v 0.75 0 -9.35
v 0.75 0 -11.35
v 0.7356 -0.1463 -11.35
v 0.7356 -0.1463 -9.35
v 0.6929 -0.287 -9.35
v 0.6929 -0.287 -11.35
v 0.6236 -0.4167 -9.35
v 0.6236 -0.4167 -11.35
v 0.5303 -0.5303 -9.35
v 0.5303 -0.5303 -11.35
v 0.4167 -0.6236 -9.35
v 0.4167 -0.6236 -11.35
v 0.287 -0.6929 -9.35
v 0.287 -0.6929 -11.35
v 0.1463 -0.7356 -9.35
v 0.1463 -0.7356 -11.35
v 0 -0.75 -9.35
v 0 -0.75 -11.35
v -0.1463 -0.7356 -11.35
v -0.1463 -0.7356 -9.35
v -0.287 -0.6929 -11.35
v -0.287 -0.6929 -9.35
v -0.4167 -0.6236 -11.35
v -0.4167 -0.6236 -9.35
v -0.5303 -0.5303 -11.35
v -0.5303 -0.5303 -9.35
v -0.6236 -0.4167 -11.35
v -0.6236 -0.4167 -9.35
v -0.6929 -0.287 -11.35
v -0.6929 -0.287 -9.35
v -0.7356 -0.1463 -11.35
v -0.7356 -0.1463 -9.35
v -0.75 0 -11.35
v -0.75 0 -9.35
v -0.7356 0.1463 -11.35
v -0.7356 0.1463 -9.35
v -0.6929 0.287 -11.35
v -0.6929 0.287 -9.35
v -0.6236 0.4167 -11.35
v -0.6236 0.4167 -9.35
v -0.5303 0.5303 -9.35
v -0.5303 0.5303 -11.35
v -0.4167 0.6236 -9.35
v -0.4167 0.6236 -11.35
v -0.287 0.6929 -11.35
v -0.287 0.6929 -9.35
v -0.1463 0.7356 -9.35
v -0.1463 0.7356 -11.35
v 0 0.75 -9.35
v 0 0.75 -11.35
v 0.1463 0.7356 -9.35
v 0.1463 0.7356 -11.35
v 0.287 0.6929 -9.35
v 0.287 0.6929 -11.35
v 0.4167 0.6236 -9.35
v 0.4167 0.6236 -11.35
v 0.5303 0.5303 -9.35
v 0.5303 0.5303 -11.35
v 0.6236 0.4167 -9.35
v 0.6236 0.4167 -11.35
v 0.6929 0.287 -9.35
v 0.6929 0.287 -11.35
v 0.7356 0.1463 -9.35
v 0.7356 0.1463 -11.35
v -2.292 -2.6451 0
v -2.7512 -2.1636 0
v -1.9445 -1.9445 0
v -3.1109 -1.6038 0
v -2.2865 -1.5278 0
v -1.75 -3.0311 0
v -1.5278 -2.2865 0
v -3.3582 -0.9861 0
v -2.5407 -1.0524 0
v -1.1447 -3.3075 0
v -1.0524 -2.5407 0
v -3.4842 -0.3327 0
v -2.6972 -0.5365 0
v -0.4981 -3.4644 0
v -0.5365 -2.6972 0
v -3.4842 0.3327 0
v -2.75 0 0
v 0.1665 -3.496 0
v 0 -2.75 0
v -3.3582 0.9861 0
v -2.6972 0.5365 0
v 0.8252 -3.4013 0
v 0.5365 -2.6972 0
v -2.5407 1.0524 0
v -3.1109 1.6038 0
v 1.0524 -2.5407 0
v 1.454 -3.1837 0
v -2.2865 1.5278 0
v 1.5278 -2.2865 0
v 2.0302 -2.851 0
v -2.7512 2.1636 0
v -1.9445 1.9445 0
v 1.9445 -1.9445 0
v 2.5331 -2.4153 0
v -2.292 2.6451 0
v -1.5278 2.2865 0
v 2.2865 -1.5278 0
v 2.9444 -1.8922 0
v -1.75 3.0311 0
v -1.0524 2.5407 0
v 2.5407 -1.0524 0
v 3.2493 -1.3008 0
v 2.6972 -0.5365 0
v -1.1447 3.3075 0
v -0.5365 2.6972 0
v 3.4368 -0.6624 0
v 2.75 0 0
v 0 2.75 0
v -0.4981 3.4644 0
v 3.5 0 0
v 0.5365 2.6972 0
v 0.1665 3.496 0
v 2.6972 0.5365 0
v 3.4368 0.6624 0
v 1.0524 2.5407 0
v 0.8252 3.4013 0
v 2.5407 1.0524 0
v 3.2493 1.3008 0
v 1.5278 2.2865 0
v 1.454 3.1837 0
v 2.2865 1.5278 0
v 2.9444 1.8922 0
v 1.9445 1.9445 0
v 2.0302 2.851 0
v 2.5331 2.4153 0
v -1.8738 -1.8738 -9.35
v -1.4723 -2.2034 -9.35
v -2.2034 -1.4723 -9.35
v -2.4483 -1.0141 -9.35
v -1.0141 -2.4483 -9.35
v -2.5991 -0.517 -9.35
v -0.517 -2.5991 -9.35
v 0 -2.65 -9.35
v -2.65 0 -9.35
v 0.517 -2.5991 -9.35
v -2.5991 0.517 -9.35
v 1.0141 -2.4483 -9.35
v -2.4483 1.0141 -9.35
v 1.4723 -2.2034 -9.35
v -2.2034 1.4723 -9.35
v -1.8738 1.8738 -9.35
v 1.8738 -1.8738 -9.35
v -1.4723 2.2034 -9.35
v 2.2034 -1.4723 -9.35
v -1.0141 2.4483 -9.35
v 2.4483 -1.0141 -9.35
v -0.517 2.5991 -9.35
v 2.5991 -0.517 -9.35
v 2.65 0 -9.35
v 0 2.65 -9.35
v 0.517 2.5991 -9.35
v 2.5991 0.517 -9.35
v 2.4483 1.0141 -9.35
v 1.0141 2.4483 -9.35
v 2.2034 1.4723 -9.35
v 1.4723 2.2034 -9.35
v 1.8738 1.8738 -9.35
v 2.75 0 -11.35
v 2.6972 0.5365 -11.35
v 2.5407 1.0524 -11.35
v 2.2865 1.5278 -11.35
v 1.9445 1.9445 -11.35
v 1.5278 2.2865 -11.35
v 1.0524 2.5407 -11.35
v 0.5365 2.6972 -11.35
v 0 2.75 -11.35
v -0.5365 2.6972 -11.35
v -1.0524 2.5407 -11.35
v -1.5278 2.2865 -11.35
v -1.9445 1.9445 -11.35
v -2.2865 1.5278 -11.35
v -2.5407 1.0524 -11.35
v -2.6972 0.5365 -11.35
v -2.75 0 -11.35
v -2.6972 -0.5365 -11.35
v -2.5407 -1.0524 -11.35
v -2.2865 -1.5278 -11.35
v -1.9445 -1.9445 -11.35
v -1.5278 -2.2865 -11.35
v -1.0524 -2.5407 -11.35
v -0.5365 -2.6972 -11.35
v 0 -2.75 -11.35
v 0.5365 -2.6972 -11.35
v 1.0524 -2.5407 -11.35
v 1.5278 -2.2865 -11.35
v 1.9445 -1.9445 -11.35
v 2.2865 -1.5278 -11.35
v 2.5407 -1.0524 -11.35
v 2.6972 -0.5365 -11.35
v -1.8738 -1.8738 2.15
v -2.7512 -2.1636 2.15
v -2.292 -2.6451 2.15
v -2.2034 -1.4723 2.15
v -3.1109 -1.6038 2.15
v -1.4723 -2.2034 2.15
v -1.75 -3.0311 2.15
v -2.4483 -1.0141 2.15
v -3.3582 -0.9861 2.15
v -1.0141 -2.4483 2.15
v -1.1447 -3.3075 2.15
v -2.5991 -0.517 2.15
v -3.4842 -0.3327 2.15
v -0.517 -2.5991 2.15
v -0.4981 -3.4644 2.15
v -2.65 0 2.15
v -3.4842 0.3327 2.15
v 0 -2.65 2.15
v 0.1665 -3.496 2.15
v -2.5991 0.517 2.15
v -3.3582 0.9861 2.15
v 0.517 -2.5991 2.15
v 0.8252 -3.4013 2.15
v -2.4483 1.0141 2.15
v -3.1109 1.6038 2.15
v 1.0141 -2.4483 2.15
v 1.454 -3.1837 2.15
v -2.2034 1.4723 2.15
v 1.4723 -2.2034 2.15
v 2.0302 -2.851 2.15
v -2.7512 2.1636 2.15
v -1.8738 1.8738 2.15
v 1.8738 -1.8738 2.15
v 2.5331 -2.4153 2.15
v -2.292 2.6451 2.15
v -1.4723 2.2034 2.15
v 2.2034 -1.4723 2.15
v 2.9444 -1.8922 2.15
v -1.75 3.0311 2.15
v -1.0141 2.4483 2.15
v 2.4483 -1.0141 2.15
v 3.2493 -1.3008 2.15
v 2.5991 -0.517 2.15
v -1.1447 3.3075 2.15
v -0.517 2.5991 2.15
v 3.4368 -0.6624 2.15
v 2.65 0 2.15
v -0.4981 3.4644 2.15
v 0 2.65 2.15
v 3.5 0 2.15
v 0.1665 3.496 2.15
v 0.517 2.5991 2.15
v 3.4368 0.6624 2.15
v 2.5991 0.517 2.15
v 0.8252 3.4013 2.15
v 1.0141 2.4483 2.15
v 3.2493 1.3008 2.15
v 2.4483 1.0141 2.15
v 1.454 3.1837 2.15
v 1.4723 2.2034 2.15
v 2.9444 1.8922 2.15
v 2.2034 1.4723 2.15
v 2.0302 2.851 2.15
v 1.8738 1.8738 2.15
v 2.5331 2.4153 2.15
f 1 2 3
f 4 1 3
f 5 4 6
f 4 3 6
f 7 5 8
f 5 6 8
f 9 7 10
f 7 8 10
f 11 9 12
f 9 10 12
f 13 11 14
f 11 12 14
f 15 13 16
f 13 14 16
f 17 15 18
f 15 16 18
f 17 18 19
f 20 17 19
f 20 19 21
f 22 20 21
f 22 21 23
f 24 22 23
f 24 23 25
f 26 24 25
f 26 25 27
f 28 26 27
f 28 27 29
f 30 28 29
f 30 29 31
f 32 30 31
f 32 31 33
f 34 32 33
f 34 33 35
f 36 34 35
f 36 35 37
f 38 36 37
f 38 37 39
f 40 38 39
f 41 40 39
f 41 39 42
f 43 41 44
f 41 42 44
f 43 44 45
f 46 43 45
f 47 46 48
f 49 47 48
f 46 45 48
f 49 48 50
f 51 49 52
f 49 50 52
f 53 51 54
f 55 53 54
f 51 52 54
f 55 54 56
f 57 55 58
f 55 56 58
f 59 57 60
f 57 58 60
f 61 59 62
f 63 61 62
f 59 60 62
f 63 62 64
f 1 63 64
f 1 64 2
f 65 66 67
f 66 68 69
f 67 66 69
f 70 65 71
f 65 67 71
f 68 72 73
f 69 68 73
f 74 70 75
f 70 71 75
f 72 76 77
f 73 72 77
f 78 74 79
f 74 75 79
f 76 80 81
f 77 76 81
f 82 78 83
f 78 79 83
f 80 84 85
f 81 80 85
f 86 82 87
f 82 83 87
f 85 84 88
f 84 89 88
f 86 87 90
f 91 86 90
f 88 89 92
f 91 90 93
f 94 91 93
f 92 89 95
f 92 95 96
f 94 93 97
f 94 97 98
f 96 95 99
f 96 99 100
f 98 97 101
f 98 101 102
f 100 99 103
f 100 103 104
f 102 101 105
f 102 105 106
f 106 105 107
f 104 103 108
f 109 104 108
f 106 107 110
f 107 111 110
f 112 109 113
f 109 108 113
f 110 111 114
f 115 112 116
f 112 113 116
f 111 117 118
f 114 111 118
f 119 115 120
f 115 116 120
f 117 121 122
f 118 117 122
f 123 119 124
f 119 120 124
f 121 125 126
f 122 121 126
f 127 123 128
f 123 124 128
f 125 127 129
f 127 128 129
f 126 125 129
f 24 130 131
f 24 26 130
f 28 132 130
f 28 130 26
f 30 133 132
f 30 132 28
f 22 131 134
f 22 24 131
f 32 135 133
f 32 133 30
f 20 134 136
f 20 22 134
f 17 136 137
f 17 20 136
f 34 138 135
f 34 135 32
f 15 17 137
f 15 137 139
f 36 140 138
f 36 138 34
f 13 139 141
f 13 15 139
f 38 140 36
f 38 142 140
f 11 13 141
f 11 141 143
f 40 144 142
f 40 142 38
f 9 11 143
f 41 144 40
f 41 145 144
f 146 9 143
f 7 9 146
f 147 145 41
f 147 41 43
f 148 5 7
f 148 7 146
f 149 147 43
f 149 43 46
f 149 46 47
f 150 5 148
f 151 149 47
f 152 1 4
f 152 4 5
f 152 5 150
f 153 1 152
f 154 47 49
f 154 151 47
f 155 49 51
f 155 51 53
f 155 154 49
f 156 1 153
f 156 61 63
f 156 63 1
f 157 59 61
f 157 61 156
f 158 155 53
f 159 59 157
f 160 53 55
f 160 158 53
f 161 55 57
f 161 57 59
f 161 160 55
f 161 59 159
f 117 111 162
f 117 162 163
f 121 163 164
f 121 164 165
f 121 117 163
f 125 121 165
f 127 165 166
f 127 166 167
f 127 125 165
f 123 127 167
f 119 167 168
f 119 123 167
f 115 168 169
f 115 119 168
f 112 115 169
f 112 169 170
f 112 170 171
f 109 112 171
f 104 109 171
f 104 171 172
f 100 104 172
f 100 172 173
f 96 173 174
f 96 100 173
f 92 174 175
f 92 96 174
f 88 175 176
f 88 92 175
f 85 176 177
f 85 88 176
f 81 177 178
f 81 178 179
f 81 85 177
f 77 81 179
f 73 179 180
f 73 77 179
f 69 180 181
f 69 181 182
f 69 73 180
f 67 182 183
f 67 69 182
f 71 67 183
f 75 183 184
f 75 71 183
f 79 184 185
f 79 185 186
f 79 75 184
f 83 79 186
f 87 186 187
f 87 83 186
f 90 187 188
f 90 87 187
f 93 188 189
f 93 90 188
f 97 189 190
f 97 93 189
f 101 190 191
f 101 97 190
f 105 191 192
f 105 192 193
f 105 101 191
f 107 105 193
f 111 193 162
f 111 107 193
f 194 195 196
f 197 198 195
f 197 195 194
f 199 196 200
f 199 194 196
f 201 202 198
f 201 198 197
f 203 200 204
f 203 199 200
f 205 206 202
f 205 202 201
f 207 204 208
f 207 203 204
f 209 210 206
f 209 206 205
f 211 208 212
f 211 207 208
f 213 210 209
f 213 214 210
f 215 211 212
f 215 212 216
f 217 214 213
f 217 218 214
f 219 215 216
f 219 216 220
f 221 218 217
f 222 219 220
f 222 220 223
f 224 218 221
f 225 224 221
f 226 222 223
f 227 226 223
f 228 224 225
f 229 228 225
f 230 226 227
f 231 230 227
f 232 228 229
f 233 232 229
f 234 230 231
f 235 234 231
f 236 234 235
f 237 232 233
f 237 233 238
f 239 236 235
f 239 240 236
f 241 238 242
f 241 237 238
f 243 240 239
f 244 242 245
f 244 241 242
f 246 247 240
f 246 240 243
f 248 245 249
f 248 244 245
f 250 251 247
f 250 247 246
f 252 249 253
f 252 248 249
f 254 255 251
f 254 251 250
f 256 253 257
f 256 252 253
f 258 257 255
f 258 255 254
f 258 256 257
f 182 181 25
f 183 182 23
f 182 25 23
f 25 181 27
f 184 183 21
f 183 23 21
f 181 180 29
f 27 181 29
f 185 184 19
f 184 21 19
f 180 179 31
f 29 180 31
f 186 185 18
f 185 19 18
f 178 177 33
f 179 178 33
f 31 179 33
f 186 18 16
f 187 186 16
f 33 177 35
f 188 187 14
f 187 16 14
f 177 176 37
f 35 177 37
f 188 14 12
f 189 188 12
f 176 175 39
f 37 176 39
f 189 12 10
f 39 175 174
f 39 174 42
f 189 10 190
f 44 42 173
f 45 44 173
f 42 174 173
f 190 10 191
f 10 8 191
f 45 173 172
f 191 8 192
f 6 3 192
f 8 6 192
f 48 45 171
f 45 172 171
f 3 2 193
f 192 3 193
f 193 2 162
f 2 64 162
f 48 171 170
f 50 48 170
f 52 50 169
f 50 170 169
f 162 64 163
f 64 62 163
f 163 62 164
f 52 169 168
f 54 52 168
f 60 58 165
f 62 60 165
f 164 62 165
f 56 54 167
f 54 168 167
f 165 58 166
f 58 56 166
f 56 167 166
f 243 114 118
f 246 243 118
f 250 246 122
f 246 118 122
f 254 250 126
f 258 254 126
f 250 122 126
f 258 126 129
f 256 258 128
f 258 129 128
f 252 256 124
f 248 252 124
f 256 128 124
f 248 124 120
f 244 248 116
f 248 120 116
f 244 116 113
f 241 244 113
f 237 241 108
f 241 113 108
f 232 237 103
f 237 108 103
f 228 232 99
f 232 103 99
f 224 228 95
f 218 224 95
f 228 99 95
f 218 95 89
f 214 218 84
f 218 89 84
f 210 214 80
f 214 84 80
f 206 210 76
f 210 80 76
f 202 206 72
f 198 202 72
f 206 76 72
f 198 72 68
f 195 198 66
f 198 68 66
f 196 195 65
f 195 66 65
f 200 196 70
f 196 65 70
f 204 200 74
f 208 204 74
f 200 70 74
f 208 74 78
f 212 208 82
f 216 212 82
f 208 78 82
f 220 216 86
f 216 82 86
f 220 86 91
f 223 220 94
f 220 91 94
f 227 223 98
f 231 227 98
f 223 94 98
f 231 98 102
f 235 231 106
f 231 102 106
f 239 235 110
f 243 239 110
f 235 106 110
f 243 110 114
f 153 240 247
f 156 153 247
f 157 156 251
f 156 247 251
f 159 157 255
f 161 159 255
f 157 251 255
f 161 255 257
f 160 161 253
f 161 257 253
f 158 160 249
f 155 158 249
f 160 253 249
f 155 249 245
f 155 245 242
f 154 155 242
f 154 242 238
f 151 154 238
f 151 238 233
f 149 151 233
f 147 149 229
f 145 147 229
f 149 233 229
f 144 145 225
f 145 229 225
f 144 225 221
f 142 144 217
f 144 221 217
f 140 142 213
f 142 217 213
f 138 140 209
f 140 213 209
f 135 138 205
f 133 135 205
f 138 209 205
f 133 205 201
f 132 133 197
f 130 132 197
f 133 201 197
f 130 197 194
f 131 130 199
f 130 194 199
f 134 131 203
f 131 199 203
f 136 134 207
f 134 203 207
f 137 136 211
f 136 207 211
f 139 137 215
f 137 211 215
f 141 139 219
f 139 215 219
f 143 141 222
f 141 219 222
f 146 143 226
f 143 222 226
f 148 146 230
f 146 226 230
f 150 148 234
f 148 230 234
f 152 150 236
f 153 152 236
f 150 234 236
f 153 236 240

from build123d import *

# Parameters (mm, degrees)
F0_R     = 3.5
F1_DEPTH = 2.15
F2_R     = 2.75
F3_DEPTH = 11.35
F4_R     = 2.65
F5_DEPTH = 11.5
F6_R     = 0.75
F7_DEPTH = 13.501


with BuildPart() as f1:
    # F0 (on Top) → F1 (new body)
    with BuildSketch(Plane.XY):
        Circle(F0_R)
    extrude(amount=F1_DEPTH)

    # F2 (on Top) → F3 (join)
    with BuildSketch(Plane.XY):
        Circle(F2_R)
    extrude(amount=-F3_DEPTH)

    # F4 (on face) → F5 (cut)
    with BuildSketch(Plane.XY.offset(2.15)):
        Circle(F4_R)
    extrude(amount=-F5_DEPTH, mode=Mode.SUBTRACT)

    # F6 (on face) → F7 (cut, through all)
    with BuildSketch(Plane(origin=(0, 0, -11.35), x_dir=(1, 0, 0), z_dir=(0, 0, -1))):
        Circle(F6_R)
    extrude(amount=-F7_DEPTH, mode=Mode.SUBTRACT)


solid = f1.part
